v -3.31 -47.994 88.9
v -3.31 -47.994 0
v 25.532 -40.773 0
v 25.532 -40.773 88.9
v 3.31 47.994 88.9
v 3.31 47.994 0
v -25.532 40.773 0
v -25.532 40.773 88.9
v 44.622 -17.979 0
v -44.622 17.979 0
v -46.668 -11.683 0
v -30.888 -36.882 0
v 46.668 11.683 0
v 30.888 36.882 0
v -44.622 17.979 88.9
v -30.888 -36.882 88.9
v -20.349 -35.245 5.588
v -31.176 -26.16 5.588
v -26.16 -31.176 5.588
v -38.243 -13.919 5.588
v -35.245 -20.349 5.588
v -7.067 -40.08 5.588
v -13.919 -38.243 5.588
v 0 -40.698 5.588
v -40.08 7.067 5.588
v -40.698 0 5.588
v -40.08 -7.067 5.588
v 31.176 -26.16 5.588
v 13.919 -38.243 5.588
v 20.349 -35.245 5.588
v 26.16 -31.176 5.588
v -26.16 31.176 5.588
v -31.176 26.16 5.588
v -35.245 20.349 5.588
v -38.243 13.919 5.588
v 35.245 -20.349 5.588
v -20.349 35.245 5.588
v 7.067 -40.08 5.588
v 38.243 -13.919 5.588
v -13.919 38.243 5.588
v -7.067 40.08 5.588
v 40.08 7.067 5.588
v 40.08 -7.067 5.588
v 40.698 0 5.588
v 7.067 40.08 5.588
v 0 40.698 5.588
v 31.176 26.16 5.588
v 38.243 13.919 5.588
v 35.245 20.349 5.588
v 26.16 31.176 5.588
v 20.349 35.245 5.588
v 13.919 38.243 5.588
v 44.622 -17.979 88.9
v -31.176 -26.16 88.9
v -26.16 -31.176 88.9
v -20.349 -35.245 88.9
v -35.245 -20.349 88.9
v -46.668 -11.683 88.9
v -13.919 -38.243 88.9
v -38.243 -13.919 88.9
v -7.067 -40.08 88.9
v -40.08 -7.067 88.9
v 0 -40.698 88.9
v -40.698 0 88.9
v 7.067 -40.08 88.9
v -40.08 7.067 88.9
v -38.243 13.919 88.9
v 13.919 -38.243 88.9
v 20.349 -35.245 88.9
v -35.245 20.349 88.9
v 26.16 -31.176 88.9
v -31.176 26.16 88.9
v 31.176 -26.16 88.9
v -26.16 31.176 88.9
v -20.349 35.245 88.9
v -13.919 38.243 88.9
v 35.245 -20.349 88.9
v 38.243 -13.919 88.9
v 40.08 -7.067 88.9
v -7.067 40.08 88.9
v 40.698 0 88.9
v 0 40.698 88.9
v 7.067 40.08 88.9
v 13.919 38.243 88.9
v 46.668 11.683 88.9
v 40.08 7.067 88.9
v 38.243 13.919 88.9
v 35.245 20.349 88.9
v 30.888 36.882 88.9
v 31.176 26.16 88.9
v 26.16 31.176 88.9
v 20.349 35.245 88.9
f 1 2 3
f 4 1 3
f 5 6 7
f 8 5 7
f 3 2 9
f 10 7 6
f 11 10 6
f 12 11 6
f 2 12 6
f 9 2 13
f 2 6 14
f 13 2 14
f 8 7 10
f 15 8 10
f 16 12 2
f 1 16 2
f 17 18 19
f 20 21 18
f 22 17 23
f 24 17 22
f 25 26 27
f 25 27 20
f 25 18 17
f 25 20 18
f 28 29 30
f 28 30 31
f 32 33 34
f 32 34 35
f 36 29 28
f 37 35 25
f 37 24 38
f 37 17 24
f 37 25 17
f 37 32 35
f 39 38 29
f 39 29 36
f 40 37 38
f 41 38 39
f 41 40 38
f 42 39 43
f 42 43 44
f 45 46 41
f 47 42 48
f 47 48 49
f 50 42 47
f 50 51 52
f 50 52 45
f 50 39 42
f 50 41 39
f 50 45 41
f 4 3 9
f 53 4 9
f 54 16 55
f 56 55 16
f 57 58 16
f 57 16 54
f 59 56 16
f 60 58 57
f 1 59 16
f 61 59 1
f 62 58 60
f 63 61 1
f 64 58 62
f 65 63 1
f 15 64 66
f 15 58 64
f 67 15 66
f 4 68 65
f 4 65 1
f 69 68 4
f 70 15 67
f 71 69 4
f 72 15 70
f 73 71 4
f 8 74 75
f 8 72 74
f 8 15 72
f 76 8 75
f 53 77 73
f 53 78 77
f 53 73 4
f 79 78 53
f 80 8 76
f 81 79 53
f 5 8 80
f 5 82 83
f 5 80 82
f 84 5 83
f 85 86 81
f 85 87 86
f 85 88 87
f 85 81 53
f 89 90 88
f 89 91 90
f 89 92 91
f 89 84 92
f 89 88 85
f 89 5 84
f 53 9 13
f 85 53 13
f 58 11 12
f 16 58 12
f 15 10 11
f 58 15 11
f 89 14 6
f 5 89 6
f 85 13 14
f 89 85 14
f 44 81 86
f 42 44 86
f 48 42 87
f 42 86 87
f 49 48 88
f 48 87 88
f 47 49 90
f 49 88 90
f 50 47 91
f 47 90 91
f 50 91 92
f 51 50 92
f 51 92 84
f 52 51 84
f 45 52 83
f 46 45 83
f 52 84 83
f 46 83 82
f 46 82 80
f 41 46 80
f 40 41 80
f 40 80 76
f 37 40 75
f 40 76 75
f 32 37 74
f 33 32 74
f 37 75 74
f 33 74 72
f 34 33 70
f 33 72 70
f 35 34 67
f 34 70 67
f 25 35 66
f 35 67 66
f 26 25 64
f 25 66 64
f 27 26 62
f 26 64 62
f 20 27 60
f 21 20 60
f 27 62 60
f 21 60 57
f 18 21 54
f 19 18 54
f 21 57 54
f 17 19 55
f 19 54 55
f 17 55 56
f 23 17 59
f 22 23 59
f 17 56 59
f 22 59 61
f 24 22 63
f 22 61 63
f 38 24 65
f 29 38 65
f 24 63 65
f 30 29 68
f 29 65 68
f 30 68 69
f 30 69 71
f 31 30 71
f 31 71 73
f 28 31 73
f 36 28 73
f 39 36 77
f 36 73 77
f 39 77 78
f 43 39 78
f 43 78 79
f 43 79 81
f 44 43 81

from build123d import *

# Parameters (mm, degrees)
F2_DEPTH = 88.9
F3_R     = 40.697857
F4_DEPTH = 83.312


with BuildPart() as f2:
    # F1 (on face) → F2 (new body)
    with BuildSketch(Plane.XY):
        Polygon((25.532047, -40.773313), (44.621812, -17.978942), (46.667561, 11.682773), (30.887888, 36.882066), (3.310092, 47.993663), (-25.532047, 40.773313), (-44.621812, 17.978942), (-46.667561, -11.682773), (-30.887888, -36.882066), (-3.310092, -47.993663), align=None)
    extrude(amount=F2_DEPTH)

    # F3 (on face) → F4 (cut)
    with BuildSketch(Plane.XY.offset(88.9)):
        Circle(F3_R)
    extrude(amount=-F4_DEPTH, mode=Mode.SUBTRACT)


solid = f2.part
